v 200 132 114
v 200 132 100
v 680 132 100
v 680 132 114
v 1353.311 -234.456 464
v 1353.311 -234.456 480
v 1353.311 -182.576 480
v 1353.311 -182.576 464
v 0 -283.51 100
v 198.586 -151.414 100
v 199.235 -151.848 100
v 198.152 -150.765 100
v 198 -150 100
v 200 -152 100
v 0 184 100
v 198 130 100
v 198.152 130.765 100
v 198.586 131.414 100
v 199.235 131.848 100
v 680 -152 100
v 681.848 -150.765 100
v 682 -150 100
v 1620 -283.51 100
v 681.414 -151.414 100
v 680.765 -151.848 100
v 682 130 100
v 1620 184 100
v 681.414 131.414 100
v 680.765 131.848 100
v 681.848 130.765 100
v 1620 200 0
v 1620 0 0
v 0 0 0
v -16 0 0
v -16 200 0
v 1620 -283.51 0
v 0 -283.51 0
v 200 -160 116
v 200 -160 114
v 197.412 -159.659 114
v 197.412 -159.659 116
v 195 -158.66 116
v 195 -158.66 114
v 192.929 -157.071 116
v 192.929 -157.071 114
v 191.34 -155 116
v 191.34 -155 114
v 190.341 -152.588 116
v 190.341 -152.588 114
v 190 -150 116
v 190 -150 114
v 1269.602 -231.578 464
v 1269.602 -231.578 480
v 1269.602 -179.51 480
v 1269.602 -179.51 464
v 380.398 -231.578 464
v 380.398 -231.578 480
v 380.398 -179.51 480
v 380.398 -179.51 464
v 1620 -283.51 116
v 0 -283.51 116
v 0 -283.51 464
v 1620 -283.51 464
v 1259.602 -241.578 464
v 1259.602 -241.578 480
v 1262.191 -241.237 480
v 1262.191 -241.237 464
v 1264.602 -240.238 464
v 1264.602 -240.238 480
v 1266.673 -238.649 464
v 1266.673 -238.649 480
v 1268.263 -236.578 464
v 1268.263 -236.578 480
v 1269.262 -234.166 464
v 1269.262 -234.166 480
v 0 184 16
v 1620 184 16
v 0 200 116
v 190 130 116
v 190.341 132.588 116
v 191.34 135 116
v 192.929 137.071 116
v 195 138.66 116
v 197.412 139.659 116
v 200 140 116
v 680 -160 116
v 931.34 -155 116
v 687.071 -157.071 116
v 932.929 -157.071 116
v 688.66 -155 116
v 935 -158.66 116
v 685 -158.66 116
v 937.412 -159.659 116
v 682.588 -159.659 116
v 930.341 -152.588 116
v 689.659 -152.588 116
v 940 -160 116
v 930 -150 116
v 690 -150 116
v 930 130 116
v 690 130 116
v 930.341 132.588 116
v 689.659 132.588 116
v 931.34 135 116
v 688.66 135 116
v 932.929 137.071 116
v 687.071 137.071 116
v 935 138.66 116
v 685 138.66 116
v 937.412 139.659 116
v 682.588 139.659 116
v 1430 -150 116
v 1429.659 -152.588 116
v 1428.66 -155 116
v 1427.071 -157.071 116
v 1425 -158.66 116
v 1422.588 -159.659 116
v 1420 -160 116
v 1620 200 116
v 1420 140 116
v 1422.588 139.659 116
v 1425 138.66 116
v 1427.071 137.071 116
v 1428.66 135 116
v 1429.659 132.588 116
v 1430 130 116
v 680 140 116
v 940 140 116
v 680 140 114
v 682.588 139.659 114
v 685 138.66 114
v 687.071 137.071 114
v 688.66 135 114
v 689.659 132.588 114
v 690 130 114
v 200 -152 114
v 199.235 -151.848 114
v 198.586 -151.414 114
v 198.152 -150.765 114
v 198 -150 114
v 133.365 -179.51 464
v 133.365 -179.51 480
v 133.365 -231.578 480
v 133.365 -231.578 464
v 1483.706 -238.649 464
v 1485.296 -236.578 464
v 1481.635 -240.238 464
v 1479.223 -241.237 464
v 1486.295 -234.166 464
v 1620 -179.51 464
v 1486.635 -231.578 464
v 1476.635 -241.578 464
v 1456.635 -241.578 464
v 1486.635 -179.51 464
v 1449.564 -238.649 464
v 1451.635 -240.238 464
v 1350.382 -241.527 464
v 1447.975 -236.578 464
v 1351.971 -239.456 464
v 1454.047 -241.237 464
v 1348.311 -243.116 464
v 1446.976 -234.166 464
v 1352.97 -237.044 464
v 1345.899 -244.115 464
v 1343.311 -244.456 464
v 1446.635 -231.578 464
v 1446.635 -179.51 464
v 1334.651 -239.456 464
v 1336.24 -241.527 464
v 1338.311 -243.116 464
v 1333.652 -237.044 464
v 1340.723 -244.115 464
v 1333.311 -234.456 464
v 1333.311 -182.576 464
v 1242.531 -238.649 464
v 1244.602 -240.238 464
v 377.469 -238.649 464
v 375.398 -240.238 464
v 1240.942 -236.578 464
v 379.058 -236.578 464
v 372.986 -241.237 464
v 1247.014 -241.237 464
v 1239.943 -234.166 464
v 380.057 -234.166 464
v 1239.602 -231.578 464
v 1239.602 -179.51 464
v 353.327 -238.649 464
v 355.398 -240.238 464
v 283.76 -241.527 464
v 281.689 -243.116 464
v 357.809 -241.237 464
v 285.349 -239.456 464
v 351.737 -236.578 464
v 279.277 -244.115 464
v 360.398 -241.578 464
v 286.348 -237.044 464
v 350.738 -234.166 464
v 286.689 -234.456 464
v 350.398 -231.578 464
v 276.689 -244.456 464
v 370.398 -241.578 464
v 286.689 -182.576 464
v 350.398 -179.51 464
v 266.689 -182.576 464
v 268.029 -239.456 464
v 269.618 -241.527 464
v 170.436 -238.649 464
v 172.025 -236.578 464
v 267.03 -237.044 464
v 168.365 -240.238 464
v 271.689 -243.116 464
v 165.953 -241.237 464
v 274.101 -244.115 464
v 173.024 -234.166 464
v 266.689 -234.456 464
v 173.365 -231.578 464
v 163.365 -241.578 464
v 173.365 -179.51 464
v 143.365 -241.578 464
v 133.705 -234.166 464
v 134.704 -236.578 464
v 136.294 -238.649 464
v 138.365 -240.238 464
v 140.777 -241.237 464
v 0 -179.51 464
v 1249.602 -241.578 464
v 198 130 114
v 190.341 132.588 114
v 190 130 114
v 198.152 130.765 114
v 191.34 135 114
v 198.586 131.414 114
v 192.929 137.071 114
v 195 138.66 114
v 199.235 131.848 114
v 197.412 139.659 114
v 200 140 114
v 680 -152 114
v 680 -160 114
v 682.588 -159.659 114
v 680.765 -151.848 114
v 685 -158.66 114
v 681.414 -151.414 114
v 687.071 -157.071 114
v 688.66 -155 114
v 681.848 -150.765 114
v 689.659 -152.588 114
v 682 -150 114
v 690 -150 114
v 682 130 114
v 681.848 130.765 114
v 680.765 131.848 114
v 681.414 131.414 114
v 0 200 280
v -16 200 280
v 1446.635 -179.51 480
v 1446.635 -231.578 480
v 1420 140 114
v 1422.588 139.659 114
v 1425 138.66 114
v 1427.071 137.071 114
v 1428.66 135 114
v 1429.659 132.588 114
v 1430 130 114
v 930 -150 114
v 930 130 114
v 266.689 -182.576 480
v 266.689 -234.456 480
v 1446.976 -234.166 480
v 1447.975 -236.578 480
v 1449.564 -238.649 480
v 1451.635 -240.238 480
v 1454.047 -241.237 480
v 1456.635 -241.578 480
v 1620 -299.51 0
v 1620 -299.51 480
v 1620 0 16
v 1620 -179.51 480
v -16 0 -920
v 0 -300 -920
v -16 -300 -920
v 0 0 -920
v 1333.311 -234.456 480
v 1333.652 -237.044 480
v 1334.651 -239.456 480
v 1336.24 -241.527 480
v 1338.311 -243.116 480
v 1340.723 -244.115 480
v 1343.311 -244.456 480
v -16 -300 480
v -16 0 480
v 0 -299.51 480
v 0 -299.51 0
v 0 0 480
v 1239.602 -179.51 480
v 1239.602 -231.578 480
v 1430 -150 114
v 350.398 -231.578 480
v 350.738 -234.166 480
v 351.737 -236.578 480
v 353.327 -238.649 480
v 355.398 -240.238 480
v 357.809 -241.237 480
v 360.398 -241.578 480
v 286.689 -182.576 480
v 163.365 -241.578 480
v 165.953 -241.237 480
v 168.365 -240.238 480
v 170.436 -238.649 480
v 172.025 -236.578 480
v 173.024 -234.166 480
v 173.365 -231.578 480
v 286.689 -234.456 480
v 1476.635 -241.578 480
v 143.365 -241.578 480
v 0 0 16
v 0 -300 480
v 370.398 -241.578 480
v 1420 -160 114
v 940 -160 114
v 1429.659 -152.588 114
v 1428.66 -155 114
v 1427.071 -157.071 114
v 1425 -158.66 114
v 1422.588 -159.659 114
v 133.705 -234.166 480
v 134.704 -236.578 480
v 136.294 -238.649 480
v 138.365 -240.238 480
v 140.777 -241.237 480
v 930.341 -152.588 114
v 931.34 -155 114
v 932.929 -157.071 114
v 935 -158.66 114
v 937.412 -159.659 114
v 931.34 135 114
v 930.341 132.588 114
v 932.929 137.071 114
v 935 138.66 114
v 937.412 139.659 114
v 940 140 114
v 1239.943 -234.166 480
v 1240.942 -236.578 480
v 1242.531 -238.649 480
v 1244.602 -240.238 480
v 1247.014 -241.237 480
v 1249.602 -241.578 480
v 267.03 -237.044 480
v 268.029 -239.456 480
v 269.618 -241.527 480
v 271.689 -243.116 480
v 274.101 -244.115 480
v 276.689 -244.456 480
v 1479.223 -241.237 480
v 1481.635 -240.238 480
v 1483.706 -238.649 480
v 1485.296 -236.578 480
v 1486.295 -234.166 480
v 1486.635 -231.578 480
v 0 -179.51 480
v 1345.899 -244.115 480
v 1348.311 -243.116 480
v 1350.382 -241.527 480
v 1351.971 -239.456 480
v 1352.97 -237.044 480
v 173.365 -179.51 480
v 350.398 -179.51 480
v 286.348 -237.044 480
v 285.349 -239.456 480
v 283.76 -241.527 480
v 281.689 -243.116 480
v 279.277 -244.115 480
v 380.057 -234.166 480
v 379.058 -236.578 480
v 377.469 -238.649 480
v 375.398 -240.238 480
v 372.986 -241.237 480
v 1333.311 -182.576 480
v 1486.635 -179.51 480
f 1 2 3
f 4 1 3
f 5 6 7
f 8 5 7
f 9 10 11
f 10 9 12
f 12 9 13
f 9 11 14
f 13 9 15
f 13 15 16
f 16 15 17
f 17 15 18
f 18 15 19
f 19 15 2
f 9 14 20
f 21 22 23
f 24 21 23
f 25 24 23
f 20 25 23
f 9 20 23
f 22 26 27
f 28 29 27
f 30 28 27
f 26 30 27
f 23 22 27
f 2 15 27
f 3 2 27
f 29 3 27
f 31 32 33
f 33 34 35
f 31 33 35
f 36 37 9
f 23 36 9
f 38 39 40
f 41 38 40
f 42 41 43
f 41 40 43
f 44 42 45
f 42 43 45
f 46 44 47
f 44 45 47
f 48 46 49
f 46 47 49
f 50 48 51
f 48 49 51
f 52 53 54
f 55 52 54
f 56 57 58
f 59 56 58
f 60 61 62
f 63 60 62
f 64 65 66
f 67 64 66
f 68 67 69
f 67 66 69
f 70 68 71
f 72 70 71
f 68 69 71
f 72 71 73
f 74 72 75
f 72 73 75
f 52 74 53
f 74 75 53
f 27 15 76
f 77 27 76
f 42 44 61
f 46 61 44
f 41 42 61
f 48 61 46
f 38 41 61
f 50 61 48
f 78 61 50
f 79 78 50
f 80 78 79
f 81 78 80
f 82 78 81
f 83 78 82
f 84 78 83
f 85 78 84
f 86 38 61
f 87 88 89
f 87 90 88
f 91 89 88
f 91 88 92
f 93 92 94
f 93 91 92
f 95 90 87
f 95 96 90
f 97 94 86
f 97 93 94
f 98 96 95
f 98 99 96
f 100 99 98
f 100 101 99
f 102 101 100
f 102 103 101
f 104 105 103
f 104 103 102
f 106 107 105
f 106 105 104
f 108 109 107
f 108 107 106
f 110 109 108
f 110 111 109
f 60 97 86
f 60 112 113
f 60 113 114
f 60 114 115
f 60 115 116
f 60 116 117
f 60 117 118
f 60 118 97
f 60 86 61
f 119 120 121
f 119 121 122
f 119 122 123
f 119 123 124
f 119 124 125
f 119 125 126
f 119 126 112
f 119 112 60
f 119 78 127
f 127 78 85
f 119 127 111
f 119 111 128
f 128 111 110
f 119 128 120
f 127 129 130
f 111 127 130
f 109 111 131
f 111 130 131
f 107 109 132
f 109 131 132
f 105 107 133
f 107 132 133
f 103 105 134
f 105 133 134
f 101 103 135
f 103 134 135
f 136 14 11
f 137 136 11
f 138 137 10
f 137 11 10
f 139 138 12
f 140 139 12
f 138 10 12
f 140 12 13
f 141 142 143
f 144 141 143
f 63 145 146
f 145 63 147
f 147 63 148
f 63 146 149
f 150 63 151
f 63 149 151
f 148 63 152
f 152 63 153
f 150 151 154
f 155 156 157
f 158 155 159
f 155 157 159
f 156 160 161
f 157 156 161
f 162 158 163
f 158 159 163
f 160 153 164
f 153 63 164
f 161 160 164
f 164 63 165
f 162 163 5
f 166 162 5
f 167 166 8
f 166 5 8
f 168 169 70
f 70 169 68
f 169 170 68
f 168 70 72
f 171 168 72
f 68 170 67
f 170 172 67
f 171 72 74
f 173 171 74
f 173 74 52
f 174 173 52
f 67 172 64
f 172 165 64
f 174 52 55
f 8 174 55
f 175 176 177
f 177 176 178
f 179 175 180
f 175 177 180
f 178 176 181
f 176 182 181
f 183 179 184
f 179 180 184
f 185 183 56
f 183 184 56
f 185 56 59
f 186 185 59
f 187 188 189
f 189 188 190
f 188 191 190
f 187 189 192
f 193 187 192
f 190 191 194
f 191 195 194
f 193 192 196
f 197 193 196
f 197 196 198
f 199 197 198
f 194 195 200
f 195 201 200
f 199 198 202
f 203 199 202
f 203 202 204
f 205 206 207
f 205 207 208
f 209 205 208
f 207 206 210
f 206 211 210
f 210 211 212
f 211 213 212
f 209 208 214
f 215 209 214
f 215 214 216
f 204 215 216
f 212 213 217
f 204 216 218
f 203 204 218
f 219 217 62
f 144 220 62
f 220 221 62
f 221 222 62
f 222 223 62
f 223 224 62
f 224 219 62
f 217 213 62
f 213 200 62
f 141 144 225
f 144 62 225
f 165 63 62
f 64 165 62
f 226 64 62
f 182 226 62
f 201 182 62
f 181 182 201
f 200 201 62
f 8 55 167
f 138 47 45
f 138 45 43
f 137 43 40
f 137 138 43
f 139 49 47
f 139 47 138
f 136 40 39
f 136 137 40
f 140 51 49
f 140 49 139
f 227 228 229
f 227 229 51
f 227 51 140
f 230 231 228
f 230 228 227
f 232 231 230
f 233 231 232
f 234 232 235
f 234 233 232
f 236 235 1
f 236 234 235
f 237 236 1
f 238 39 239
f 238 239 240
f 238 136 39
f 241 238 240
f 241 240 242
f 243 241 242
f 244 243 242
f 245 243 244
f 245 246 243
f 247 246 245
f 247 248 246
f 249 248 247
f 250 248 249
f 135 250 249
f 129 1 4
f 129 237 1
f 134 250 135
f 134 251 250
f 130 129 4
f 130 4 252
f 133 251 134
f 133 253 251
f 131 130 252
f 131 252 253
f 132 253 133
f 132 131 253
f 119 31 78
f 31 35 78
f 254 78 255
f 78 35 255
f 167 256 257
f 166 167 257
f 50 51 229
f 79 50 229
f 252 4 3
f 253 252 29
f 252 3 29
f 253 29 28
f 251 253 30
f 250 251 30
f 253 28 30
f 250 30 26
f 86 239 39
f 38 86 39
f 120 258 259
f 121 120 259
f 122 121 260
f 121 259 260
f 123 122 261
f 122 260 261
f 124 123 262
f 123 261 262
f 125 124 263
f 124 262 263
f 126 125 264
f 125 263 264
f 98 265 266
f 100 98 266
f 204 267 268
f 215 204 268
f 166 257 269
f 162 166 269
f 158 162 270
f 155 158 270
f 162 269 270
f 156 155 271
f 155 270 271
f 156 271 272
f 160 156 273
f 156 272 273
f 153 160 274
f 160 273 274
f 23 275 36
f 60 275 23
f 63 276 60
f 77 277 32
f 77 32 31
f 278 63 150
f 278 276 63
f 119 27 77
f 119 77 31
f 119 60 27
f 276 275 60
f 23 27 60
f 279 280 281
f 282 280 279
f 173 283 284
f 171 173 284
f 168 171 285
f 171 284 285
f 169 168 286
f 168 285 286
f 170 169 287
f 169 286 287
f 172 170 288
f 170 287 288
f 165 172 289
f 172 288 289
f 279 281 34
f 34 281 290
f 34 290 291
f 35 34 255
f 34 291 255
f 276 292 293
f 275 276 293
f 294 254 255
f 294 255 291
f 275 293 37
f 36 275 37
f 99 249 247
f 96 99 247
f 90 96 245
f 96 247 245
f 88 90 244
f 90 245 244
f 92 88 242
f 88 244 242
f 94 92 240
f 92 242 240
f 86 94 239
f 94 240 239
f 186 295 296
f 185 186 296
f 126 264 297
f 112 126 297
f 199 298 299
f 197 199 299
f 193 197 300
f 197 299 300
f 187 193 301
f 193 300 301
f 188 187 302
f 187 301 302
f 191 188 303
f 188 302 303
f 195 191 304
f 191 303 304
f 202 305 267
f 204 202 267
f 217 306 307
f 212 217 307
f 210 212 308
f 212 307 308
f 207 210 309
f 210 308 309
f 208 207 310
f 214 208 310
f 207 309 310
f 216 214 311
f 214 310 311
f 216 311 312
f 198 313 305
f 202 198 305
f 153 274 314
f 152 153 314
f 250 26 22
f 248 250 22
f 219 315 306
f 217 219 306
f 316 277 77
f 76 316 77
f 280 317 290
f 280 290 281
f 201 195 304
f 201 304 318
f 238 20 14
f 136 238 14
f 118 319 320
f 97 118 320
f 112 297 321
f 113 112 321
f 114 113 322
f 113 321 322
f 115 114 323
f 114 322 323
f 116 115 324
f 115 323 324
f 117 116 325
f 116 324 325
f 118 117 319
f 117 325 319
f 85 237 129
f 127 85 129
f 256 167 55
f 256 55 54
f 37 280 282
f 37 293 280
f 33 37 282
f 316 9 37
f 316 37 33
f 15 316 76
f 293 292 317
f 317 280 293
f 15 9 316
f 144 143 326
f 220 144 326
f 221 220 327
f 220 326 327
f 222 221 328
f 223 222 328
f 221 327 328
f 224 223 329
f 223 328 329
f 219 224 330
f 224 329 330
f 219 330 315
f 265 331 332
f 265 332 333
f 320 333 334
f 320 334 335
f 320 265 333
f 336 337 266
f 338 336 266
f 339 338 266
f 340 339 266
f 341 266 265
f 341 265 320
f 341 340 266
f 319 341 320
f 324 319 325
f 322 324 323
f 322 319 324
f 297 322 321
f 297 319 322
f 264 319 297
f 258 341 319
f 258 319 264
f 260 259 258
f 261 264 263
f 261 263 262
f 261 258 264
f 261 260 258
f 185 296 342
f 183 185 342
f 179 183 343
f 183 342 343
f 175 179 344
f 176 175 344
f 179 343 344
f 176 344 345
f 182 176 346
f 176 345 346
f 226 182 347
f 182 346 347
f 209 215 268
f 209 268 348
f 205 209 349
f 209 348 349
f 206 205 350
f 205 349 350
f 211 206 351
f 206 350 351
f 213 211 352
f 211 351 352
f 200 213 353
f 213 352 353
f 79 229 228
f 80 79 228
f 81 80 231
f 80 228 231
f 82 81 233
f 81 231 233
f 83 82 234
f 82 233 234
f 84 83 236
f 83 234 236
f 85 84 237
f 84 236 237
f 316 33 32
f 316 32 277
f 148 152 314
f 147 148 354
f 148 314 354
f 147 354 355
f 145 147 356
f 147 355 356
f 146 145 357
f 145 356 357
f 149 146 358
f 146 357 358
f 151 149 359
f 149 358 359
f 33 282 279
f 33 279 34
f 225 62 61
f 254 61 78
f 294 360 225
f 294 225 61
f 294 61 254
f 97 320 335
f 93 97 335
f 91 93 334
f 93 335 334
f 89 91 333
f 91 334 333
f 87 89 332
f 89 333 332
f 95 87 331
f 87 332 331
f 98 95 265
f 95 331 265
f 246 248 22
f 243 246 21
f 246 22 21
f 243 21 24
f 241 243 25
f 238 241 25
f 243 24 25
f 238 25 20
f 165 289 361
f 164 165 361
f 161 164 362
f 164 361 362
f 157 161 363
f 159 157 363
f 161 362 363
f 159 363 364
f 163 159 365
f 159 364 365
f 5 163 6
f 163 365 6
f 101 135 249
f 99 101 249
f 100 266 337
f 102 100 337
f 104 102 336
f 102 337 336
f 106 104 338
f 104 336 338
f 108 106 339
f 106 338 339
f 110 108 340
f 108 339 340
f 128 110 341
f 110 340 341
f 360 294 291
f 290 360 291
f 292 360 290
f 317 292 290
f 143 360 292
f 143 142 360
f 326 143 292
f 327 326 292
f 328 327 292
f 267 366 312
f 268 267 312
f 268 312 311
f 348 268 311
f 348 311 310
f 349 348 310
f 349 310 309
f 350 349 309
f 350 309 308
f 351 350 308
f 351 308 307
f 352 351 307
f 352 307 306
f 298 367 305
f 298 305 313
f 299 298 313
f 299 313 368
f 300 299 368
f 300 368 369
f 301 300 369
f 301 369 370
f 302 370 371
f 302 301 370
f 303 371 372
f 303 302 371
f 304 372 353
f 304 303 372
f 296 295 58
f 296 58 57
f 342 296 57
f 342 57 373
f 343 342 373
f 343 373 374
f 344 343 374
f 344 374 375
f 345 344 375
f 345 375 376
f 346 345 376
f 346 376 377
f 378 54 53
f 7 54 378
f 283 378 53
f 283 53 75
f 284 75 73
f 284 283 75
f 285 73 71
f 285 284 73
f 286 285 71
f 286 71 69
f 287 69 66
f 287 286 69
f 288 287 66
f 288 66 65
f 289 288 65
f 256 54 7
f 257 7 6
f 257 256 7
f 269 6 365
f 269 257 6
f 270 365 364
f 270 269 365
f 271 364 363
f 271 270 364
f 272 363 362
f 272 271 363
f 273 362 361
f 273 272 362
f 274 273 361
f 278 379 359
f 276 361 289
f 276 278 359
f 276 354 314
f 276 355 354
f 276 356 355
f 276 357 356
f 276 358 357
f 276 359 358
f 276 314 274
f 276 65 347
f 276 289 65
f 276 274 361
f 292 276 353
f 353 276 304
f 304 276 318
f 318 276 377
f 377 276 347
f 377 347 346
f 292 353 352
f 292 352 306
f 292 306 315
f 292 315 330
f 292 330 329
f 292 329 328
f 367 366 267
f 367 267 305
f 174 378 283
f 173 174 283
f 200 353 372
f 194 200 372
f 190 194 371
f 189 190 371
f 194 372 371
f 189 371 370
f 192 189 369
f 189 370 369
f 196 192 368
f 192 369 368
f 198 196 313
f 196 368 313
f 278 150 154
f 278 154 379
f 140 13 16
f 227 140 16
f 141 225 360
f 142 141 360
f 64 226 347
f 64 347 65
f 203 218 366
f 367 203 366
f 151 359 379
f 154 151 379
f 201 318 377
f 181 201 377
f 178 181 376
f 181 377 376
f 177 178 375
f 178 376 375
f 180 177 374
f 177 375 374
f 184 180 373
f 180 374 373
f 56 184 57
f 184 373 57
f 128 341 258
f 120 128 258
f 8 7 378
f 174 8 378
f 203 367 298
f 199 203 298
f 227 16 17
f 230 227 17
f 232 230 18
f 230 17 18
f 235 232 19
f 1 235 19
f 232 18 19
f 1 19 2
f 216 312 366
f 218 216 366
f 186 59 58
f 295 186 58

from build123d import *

# Parameters (mm, degrees)
F1_DEPTH = 16
F3_W     = 1620
F3_H     = 484
F4_DEPTH = 16
F5_DEPTH = 14
F6_W     = 184
F6_H     = 16
F6_W_2   = 16
F6_H_2   = 464
F7_DEPTH = 1620
F9_DEPTH = 25


# Not quite as in the source:
# - a feature names something its author has since deleted; it is built from what else it names


with BuildPart() as f1:
    # F0 (on Right) → F1 (new body)
    with BuildSketch(Plane.YZ):
        Polygon((0, 480), (-300, 480), (-300, -920), (0, -920), (0, 0), (200, 0), (200, 280), align=None)
    extrude(amount=-F1_DEPTH)

    # F3 (on offset) → F4 (join)
    with BuildSketch(Plane.XY.offset(100)):
        with Locations((810, -42)):
            Rectangle(F3_W, F3_H)
        with BuildLine():
            Line((200, 140), (680, 140))
            ThreePointArc((680, 140), (687.0710678119, 137.0710678119), (690, 130))
            Line((690, 130), (690, -150))
            ThreePointArc((690, -150), (687.0710678119, -157.0710678119), (680, -160))
            Line((680, -160), (200, -160))
            ThreePointArc((200, -160), (192.9289321881, -157.0710678119), (190, -150))
            Line((190, -150), (190, 130))
            ThreePointArc((190, 130), (192.9289321881, 137.0710678119), (200, 140))
        make_face(mode=Mode.SUBTRACT)
        with BuildLine():
            Line((940, 140), (1420, 140))
            ThreePointArc((1420, 140), (1427.0710678119, 137.0710678119), (1430, 130))
            Line((1430, 130), (1430, -150))
            ThreePointArc((1430, -150), (1427.0710678119, -157.0710678119), (1420, -160))
            Line((1420, -160), (940, -160))
            ThreePointArc((940, -160), (932.9289321881, -157.0710678119), (930, -150))
            Line((930, -150), (930, 130))
            ThreePointArc((930, 130), (932.9289321881, 137.0710678119), (940, 140))
        make_face(mode=Mode.SUBTRACT)
    extrude(amount=F4_DEPTH)

    # F3 (on offset) → F5 (join)
    with BuildSketch(Plane.XY.offset(100)):
        with BuildLine():
            ThreePointArc((690, 130), (687.0710678119, 137.0710678119), (680, 140))
            Line((680, 140), (200, 140))
            ThreePointArc((200, 140), (192.9289321881, 137.0710678119), (190, 130))
            Line((190, 130), (190, -150))
            ThreePointArc((190, -150), (192.9289321881, -157.0710678119), (200, -160))
            Line((200, -160), (680, -160))
            ThreePointArc((680, -160), (687.0710678119, -157.0710678119), (690, -150))
            Line((690, -150), (690, 130))
        make_face()
        with BuildLine():
            ThreePointArc((682, -150), (681.4142135624, -151.4142135624), (680, -152))
            Line((680, -152), (200, -152))
            ThreePointArc((200, -152), (198.5857864376, -151.4142135624), (198, -150))
            Line((198, -150), (198, 130))
            ThreePointArc((198, 130), (198.5857864376, 131.4142135624), (200, 132))
            Line((200, 132), (680, 132))
            ThreePointArc((680, 132), (681.4142135624, 131.4142135624), (682, 130))
            Line((682, 130), (682, -150))
        make_face(mode=Mode.SUBTRACT)
        with BuildLine():
            ThreePointArc((1430, 130), (1427.0710678119, 137.0710678119), (1420, 140))
            Line((1420, 140), (940, 140))
            ThreePointArc((940, 140), (932.9289321881, 137.0710678119), (930, 130))
            Line((930, 130), (930, -150))
            ThreePointArc((930, -150), (932.9289321881, -157.0710678119), (940, -160))
            Line((940, -160), (1420, -160))
            ThreePointArc((1420, -160), (1427.0710678119, -157.0710678119), (1430, -150))
            Line((1430, -150), (1430, 130))
        make_face()
    extrude(amount=F5_DEPTH)

    # F6 (on face) → F7 (join)
    with BuildSketch(Plane.YZ):
        with Locations((92, 8)):
            Rectangle(F6_W, F6_H)
        Polygon((184, 100), (184, 16), (184, 0), (200, 0), (200, 100), align=None)
        with Locations((-291.5103597641, 232)):
            Rectangle(F6_W_2, F6_H_2)
        Polygon((-299.5103597641, 480), (-299.5103597641, 464), (-283.5103597641, 464), (-179.5103597641, 464), (-179.5103597641, 480), align=None)
    extrude(amount=F7_DEPTH)

    # F8 (on face) → F9 (cut)
    with BuildSketch(Plane.XY.offset(480)):
        with BuildLine():
            Line((286.6890323162, -182.5759112835), (266.6890323162, -182.5759112835))
            Line((266.6890323162, -182.5759112835), (266.6890323162, -234.4558739662))
            ThreePointArc((266.6890323162, -234.4558739662), (269.6179645043, -241.5269417781), (276.6890323162, -244.4558739662))
            ThreePointArc((276.6890323162, -244.4558739662), (283.7601001281, -241.5269417781), (286.6890323162, -234.4558739662))
            Line((286.6890323162, -234.4558739662), (286.6890323162, -182.5759112835))
        make_face()
        with BuildLine():
            Line((360.3975868225, -241.5777295828), (370.3975868225, -241.5777295828))
            ThreePointArc((370.3975868225, -241.5777295828), (377.4686546344, -238.6487973947), (380.3975868225, -231.5777295828))
            Line((380.3975868225, -231.5777295828), (380.3975868225, -171.0633635521))
            Line((380.3975868225, -171.0633635521), (350.3975868225, -171.0633635521))
            Line((350.3975868225, -171.0633635521), (350.3975868225, -231.5777295828))
            ThreePointArc((350.3975868225, -231.5777295828), (353.3265190106, -238.6487973947), (360.3975868225, -241.5777295828))
        make_face()
        with BuildLine():
            Line((173.3647221327, -231.5777295828), (173.3647221327, -174.4069010019))
            Line((173.3647221327, -174.4069010019), (133.3647221327, -174.4069010019))
            Line((133.3647221327, -174.4069010019), (133.3647221327, -231.5777295828))
            ThreePointArc((133.3647221327, -231.5777295828), (136.2936543208, -238.6487973947), (143.3647221327, -241.5777295828))
            Line((143.3647221327, -241.5777295828), (163.3647221327, -241.5777295828))
            ThreePointArc((163.3647221327, -241.5777295828), (170.4357899445, -238.6487973947), (173.3647221327, -231.5777295828))
        make_face()
        with BuildLine():
            ThreePointArc((1239.6024131775, -231.5777295828), (1242.5313453656, -238.6487973947), (1249.6024131775, -241.5777295828))
            Line((1249.6024131775, -241.5777295828), (1259.6024131775, -241.5777295828))
            ThreePointArc((1259.6024131775, -241.5777295828), (1266.6734809894, -238.6487973947), (1269.6024131775, -231.5777295828))
            Line((1269.6024131775, -231.5777295828), (1269.6024131775, -171.0633635521))
            Line((1269.6024131775, -171.0633635521), (1239.6024131775, -171.0633635521))
            Line((1239.6024131775, -171.0633635521), (1239.6024131775, -231.5777295828))
        make_face()
        with BuildLine():
            ThreePointArc((1343.3109676838, -244.4558739662), (1350.3820354957, -241.5269417781), (1353.3109676838, -234.4558739662))
            Line((1353.3109676838, -234.4558739662), (1353.3109676838, -182.5759112835))
            Line((1353.3109676838, -182.5759112835), (1333.3109676838, -182.5759112835))
            Line((1333.3109676838, -182.5759112835), (1333.3109676838, -234.4558739662))
            ThreePointArc((1333.3109676838, -234.4558739662), (1336.2398998719, -241.5269417781), (1343.3109676838, -244.4558739662))
        make_face()
        with BuildLine():
            ThreePointArc((1446.6352778673, -231.5777295828), (1449.5642100555, -238.6487973947), (1456.6352778673, -241.5777295828))
            Line((1456.6352778673, -241.5777295828), (1476.6352778673, -241.5777295828))
            ThreePointArc((1476.6352778673, -241.5777295828), (1483.7063456792, -238.6487973947), (1486.6352778673, -231.5777295828))
            Line((1486.6352778673, -231.5777295828), (1486.6352778673, -174.4069010019))
            Line((1486.6352778673, -174.4069010019), (1446.6352778673, -174.4069010019))
            Line((1446.6352778673, -174.4069010019), (1446.6352778673, -231.5777295828))
        make_face()
    extrude(amount=-F9_DEPTH, mode=Mode.SUBTRACT)


solid = f1.part
